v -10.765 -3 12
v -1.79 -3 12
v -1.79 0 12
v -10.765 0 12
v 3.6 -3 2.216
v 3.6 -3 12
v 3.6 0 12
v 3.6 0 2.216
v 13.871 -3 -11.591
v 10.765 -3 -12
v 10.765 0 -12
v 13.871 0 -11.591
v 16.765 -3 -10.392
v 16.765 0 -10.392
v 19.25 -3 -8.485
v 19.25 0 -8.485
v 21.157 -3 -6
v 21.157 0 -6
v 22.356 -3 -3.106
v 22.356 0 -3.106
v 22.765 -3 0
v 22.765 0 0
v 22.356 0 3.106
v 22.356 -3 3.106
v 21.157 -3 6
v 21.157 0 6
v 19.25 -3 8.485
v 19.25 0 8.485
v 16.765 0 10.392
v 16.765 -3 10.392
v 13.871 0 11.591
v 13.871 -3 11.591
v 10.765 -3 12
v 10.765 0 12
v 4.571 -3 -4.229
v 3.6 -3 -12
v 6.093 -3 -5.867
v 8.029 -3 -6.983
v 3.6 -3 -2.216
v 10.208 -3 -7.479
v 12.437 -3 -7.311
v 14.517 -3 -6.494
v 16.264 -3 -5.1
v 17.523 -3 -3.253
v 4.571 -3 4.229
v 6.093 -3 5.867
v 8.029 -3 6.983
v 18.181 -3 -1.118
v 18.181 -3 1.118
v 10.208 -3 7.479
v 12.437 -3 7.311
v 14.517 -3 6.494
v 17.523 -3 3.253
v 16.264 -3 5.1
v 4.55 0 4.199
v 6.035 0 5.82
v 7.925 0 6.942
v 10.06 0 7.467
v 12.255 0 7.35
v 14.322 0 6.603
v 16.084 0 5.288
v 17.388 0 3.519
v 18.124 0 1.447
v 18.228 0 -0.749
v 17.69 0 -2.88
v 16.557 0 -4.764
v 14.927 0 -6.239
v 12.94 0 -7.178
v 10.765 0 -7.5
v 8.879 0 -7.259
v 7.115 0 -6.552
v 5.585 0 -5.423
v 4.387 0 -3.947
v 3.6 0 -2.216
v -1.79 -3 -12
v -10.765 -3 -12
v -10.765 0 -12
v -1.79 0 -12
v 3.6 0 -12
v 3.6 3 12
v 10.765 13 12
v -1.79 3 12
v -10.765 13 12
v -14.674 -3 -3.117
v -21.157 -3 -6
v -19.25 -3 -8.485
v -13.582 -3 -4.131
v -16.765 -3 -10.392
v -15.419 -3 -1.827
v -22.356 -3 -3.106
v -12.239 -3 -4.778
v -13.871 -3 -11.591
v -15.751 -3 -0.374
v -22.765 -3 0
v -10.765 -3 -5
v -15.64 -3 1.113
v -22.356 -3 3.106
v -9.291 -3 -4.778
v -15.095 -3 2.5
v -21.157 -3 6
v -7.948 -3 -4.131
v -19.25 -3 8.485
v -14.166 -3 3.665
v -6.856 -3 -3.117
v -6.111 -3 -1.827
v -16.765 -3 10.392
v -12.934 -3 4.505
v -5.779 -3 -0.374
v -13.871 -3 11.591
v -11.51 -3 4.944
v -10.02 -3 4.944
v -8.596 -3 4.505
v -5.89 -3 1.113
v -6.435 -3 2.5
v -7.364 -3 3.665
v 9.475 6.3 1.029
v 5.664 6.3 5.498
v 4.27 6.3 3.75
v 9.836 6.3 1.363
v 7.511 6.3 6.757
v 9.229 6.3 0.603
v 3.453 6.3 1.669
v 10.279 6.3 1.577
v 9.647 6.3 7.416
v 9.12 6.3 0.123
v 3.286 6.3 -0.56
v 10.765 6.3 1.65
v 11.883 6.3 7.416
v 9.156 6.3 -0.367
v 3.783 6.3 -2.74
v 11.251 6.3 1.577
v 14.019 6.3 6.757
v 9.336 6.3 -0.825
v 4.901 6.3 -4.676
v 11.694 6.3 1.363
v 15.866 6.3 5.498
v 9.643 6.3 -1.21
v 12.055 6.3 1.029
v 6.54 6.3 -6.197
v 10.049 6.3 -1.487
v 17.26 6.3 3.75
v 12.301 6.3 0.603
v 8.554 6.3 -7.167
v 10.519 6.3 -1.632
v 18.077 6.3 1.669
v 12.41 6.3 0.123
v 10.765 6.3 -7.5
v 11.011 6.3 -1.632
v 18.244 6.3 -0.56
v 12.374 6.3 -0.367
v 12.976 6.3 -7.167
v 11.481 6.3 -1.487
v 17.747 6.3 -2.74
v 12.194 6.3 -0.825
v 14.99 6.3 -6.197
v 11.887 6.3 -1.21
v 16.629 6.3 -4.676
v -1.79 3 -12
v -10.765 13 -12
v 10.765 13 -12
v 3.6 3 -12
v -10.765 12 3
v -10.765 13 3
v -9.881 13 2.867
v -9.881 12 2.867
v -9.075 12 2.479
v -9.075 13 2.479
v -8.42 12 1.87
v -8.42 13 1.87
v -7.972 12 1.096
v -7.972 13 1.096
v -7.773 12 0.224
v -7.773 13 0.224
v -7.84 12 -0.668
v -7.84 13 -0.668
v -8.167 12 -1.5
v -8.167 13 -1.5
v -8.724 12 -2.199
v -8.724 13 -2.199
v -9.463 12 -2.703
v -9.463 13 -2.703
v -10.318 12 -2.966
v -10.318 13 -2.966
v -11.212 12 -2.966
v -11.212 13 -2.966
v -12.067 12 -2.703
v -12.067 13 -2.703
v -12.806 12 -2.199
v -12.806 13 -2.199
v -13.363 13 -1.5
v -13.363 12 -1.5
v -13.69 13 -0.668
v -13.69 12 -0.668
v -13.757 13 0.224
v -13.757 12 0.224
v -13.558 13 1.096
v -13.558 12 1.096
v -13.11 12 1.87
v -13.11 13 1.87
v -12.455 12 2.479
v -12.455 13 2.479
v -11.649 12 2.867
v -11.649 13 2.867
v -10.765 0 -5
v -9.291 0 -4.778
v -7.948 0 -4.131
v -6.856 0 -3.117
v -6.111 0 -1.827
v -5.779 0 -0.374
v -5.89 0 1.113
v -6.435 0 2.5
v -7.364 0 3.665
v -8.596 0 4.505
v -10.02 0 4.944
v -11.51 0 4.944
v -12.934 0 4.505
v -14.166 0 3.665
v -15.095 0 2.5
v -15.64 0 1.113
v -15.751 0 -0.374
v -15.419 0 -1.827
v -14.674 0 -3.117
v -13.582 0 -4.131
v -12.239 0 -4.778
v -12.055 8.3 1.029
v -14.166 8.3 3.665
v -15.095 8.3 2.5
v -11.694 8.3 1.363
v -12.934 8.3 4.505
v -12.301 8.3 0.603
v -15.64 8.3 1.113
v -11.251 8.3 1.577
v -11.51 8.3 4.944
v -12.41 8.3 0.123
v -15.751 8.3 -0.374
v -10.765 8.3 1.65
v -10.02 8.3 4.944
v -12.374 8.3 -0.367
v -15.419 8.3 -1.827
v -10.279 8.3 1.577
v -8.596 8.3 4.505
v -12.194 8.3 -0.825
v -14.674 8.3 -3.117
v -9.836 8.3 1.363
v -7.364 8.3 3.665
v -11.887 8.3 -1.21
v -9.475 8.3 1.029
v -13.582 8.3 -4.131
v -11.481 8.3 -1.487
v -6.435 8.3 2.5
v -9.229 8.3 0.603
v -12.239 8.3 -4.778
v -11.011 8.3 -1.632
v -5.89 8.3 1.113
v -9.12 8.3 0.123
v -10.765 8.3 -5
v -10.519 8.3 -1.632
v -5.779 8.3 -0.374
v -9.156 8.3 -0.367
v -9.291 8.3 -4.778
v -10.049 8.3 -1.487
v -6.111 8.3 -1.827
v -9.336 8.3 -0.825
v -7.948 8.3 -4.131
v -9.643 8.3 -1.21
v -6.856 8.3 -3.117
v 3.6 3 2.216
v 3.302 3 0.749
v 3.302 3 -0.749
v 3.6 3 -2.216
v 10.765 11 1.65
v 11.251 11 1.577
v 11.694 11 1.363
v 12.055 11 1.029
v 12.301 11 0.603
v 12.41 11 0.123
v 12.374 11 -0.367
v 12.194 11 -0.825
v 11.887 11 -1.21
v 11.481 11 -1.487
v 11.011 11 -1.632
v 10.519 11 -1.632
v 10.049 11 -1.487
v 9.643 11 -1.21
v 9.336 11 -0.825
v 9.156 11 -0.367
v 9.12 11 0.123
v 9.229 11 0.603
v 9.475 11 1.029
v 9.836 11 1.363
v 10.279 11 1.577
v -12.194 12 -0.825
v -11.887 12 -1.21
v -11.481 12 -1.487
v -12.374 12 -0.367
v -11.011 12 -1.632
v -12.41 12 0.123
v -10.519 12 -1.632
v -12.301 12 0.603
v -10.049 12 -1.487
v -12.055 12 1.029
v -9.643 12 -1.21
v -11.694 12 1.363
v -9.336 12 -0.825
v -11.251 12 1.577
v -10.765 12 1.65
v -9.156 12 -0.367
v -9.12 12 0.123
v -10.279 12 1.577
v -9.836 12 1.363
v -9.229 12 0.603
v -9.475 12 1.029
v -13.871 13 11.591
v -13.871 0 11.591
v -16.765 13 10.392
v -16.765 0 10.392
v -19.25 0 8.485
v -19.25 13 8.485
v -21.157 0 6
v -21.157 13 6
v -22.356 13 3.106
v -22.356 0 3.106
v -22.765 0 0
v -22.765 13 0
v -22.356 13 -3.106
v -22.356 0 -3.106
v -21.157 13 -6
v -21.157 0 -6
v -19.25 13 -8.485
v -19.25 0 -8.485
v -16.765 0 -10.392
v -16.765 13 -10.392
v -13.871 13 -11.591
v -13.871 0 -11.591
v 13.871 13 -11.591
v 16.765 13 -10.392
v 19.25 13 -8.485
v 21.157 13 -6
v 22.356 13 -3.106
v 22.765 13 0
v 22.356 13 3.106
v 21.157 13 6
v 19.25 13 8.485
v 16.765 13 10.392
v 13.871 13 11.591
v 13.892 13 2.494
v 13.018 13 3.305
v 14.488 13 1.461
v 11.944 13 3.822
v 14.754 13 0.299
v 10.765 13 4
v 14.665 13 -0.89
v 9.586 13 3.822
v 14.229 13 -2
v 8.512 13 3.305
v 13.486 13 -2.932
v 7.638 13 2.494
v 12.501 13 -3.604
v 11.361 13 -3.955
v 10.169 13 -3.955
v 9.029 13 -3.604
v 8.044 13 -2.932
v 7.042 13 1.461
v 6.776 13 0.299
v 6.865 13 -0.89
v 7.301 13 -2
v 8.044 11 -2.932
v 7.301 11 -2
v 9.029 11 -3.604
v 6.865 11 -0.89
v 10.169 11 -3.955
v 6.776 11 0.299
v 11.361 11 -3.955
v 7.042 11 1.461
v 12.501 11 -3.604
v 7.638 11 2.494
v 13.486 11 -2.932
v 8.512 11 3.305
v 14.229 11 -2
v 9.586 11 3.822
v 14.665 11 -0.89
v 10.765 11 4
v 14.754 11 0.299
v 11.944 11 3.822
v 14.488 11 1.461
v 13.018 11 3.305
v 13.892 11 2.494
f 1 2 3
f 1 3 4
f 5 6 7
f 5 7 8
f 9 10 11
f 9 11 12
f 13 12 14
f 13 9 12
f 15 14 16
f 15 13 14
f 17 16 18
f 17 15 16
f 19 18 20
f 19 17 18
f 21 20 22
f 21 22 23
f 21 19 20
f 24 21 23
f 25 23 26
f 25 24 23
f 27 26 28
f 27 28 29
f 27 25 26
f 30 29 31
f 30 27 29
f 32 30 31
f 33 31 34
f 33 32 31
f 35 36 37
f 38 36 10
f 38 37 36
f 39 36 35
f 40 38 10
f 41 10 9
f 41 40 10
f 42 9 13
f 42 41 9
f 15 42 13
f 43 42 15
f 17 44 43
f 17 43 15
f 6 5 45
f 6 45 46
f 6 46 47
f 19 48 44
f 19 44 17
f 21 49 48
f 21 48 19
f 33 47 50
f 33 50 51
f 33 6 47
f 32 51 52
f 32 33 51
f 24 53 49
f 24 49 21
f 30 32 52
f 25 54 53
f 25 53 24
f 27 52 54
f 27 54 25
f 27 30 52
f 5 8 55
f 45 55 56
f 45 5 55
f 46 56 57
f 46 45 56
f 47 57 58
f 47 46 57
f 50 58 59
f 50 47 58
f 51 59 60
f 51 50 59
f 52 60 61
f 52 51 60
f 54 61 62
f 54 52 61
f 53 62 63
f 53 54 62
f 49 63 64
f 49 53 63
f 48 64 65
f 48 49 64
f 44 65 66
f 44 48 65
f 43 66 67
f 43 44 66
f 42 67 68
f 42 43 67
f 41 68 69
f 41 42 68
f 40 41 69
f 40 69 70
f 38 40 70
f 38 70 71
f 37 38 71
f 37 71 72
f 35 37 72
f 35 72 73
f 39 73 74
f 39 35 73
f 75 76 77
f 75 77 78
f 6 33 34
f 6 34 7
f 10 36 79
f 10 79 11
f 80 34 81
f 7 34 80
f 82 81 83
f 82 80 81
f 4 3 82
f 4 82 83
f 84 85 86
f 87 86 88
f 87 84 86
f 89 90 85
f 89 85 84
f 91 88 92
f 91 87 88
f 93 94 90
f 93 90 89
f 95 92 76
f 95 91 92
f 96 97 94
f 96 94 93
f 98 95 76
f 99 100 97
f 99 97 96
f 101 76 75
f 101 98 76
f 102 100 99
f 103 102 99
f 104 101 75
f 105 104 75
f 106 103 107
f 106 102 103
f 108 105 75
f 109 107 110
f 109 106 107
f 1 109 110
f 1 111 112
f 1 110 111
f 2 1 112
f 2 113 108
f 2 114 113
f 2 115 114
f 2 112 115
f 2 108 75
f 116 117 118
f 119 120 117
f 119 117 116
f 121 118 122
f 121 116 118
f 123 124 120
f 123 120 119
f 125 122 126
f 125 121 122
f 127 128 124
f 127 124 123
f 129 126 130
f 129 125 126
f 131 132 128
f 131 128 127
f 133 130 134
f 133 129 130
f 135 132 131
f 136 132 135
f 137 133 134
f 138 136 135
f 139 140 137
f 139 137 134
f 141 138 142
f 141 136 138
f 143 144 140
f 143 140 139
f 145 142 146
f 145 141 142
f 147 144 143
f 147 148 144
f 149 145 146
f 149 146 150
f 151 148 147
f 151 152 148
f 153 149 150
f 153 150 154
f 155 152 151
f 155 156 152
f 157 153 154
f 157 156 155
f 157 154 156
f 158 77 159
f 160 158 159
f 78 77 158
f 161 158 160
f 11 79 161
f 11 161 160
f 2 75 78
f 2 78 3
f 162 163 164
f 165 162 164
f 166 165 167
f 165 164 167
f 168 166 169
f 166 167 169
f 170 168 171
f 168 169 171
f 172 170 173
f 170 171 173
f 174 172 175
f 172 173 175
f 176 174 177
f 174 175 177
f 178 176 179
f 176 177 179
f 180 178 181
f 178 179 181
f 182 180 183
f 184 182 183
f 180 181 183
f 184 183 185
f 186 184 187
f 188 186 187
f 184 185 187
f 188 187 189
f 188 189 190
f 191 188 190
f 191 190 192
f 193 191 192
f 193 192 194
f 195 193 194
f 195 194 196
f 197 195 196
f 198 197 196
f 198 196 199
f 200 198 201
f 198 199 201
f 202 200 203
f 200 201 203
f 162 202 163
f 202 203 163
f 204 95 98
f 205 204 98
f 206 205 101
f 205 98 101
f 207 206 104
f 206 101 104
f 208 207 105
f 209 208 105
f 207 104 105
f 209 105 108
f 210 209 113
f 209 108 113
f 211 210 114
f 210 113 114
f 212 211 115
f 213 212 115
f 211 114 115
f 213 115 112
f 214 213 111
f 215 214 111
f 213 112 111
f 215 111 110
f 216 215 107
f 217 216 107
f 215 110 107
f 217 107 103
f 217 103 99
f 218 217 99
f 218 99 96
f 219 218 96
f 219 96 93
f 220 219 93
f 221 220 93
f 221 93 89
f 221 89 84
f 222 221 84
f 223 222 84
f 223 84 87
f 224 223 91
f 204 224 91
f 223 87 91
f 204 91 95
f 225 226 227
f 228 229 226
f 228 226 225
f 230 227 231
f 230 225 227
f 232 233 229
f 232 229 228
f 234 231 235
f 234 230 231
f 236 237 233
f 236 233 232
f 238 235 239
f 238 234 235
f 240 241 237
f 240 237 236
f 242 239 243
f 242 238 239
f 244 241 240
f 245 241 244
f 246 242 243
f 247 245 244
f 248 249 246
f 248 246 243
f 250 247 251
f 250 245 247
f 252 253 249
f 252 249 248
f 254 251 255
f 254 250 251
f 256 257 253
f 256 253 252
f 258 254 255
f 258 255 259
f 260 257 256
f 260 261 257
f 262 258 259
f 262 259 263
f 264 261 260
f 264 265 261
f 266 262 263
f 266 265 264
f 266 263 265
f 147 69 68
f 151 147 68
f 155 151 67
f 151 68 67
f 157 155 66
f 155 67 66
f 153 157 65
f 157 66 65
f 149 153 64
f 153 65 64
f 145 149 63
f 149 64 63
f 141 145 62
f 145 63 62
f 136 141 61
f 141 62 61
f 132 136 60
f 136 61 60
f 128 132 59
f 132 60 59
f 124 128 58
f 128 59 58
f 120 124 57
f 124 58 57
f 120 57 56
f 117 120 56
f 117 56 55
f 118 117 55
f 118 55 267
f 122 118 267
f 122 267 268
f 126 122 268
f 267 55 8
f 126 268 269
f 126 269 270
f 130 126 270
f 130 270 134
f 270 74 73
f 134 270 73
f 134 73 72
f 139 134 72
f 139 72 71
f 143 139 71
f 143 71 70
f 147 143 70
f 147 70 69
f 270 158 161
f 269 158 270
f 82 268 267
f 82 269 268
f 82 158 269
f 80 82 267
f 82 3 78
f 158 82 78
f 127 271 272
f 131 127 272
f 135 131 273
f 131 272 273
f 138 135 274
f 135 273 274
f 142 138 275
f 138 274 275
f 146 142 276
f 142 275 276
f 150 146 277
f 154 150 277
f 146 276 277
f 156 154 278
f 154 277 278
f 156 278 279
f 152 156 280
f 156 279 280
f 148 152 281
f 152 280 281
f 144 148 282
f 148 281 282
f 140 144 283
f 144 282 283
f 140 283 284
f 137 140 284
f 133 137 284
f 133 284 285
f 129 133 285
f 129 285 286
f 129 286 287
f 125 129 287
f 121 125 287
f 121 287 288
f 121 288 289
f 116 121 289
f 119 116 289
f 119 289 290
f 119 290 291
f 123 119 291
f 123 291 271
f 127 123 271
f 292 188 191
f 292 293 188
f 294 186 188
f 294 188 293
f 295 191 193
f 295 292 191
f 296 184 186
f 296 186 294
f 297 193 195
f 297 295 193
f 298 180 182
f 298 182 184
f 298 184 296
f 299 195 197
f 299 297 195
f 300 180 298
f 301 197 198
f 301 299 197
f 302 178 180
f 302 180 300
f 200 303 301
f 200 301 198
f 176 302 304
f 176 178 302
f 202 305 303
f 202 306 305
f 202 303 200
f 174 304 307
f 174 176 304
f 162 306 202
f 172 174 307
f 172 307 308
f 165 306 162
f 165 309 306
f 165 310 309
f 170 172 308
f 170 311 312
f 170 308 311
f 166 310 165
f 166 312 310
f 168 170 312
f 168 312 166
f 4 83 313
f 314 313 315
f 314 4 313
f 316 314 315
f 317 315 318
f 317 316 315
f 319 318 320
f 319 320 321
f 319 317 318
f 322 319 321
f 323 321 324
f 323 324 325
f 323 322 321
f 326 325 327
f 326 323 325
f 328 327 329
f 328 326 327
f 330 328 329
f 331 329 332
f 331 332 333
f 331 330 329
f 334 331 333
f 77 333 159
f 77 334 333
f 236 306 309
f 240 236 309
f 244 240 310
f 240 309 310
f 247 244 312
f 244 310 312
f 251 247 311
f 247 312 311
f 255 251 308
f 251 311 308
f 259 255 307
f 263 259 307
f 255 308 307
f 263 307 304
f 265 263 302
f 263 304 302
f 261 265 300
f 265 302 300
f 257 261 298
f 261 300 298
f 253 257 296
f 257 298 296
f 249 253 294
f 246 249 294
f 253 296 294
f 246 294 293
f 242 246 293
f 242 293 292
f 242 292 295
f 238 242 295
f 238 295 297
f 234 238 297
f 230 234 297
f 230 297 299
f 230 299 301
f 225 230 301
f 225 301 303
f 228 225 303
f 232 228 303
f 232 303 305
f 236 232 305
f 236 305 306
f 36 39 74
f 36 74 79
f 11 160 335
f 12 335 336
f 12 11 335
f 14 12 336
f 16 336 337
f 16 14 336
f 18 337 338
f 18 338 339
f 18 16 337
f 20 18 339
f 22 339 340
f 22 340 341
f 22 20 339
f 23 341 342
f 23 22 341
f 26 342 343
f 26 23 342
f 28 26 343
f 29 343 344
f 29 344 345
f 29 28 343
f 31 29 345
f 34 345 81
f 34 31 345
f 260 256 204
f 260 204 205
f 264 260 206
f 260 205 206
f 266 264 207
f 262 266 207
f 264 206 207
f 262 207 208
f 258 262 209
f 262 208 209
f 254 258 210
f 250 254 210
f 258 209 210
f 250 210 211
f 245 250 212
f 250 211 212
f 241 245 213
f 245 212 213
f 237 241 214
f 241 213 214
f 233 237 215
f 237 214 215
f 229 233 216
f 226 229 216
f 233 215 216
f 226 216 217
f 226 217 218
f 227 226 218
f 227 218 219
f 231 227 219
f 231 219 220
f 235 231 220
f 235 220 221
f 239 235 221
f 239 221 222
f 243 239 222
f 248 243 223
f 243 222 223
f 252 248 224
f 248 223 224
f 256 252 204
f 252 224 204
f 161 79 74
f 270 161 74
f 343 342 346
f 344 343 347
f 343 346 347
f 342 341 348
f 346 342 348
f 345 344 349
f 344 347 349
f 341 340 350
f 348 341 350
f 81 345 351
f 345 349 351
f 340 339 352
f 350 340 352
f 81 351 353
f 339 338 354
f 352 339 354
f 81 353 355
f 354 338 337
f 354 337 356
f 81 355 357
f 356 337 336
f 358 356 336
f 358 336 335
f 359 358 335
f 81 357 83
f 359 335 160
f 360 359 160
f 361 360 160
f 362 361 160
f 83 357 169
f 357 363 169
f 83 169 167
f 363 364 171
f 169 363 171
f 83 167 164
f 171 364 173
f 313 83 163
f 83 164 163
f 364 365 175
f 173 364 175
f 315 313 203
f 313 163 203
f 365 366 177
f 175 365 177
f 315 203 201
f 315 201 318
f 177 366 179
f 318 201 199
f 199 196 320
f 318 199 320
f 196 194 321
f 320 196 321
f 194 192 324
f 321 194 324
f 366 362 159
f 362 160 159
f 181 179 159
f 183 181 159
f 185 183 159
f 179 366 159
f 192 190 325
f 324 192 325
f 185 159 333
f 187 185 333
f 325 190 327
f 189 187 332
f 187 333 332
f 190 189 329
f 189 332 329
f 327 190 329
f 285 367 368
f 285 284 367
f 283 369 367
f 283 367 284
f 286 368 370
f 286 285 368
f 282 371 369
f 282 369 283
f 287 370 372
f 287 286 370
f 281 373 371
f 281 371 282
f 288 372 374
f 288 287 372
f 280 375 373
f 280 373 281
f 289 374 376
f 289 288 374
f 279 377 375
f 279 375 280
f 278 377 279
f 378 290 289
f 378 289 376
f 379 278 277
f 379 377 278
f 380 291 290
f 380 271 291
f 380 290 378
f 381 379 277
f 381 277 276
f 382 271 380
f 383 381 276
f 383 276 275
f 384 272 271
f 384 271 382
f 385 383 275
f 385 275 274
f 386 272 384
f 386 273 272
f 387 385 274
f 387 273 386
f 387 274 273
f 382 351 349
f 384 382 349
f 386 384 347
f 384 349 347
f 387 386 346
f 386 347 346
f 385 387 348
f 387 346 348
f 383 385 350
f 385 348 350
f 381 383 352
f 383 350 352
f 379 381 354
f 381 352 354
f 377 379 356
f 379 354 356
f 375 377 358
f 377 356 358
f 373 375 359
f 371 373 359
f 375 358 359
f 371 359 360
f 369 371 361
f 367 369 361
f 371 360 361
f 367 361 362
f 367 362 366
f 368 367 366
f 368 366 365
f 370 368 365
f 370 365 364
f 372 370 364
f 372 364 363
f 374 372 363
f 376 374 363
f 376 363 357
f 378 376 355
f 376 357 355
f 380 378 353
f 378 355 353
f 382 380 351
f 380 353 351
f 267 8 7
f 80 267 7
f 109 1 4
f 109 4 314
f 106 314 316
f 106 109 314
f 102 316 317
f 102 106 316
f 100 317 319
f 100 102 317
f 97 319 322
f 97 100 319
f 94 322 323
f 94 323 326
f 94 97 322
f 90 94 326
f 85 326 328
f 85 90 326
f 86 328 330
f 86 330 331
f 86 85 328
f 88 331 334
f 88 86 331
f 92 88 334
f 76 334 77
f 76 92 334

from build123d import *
from build123d.topology import SkipClean

# Parameters (mm, degrees)
EXTRUDE_1_DEPTH     = 13
CUT_EXTRUDE_1_DEPTH = 3
SKETCH_3_R          = 4
CUT_EXTRUDE_2_DEPTH = 2
SKETCH_4_R          = 1.65
CUT_EXTRUDE_3_DEPTH = 28.98651863
SKETCH_5_R          = 3
CUT_EXTRUDE_4_DEPTH = 1
SKETCH_6_R          = 1.65
CUT_EXTRUDE_5_DEPTH = 29.394457646
SKETCH_7_R          = 7.5
CUT_EXTRUDE_6_DEPTH = 6.3
SKETCH_8_R          = 5
CUT_EXTRUDE_7_DEPTH = 8.3
EXTRUDE_START       = 3
SKETCH_9_R          = 5
EXTRUDE_3_DEPTH     = 3


with BuildPart() as part:
    # 草图1 → 凸台-拉伸1 (new body)
    with BuildSketch(Plane(origin=(0, 0, 0), x_dir=(1, 0, 0), z_dir=(0, 1, 0))):
        with BuildLine():
            Line((-10.765, 12), (10.765, 12))
            ThreePointArc((10.765, 12), (22.765, 0), (10.765, -12))
            Line((10.765, -12), (-10.765, -12))
            ThreePointArc((-10.765, -12), (-22.765, 0), (-10.765, 12))
        make_face()
    extrude(amount=EXTRUDE_1_DEPTH)

    # 草图2 → 切除-拉伸1 (cut)
    with BuildSketch(Plane.XZ):
        Polygon((0, 12), (-1.79, 12), (-1.79, -12), (3.6, -12), (3.6, 12), align=None)
    extrude(amount=-CUT_EXTRUDE_1_DEPTH, mode=Mode.SUBTRACT)

    # 草图3 → 切除-拉伸2 (cut)
    with BuildSketch(Plane(origin=(0, 13, 0), x_dir=(1, 0, 0), z_dir=(0, 1, 0))):
        with Locations(Location((10.765, 0, 0), (0, 0, 270))):
            Circle(SKETCH_3_R)
    extrude(amount=-CUT_EXTRUDE_2_DEPTH, mode=Mode.SUBTRACT)

    # 草图4 → 切除-拉伸3 (cut, through all)
    with BuildSketch(Plane(origin=(0, 11, 0), x_dir=(1, 0, 0), z_dir=(0, 1, 0))):
        with Locations(Location((10.765, 0, 0), (0, 0, 270))):
            Circle(SKETCH_4_R)
    extrude(amount=-CUT_EXTRUDE_3_DEPTH, mode=Mode.SUBTRACT)

    # 草图5 → 切除-拉伸4 (cut)
    with BuildSketch(Plane(origin=(0, 13, 0), x_dir=(1, 0, 0), z_dir=(0, 1, 0))):
        with Locations(Location((-10.765, 0, 0), (0, 0, 270))):
            Circle(SKETCH_5_R)
    extrude(amount=-CUT_EXTRUDE_4_DEPTH, mode=Mode.SUBTRACT)

    # 草图6 → 切除-拉伸5 (cut, through all)
    with BuildSketch(Plane(origin=(0, 12, 0), x_dir=(1, 0, 0), z_dir=(0, 1, 0))):
        with Locations(Location((-10.765, 0, 0), (0, 0, 270))):
            Circle(SKETCH_6_R)
    extrude(amount=-CUT_EXTRUDE_5_DEPTH, mode=Mode.SUBTRACT)

    # 草图7 → 切除-拉伸6 (cut)
    with BuildSketch(Plane.XZ):
        with Locations(Location((10.765, 0, 0), (0, 0, 270))):
            Circle(SKETCH_7_R)
    extrude(amount=-CUT_EXTRUDE_6_DEPTH, mode=Mode.SUBTRACT)

    # 草图8 → 切除-拉伸7 (cut)
    with BuildSketch(Plane.XZ):
        with Locations(Location((-10.765, 0, 0), (0, 0, 270))):
            Circle(SKETCH_8_R)
    extrude(amount=-CUT_EXTRUDE_7_DEPTH, mode=Mode.SUBTRACT)

    # 草图9 → 凸台-拉伸3 (add)
    # profile 1 of 2: a face of its own
    with SkipClean():  # the faces are left unmerged after this step: merging them gives an invalid solid
        with BuildSketch(Plane.XZ.offset(EXTRUDE_START)):
            with BuildLine():
                Line((-10.765, -12), (-1.79, -12))
                Line((-1.79, -12), (-1.79, 12))
                Line((-1.79, 12), (-10.765, 12))
                ThreePointArc((-10.765, 12), (-22.765, 0), (-10.765, -12))
            make_face()
            with Locations(Location((-10.765, 0, 0), (0, 0, 270))):
                Circle(SKETCH_9_R, mode=Mode.SUBTRACT)
        # profile 2 of 2: a face of its own
        with BuildSketch(Plane.XZ.offset(EXTRUDE_START)):
            with BuildLine():
                Line((3.6, 12), (3.6, 2.216478062))
                ThreePointArc((3.6, 2.216478062), (18.265, 0), (3.6, -2.216478062))
                Line((3.6, -2.216478062), (3.6, -12))
                Line((3.6, -12), (10.765, -12))
                ThreePointArc((10.765, -12), (22.765, 0), (10.765, 12))
                Line((10.765, 12), (3.6, 12))
            make_face()
        extrude(amount=-EXTRUDE_3_DEPTH)


solid = part.part
